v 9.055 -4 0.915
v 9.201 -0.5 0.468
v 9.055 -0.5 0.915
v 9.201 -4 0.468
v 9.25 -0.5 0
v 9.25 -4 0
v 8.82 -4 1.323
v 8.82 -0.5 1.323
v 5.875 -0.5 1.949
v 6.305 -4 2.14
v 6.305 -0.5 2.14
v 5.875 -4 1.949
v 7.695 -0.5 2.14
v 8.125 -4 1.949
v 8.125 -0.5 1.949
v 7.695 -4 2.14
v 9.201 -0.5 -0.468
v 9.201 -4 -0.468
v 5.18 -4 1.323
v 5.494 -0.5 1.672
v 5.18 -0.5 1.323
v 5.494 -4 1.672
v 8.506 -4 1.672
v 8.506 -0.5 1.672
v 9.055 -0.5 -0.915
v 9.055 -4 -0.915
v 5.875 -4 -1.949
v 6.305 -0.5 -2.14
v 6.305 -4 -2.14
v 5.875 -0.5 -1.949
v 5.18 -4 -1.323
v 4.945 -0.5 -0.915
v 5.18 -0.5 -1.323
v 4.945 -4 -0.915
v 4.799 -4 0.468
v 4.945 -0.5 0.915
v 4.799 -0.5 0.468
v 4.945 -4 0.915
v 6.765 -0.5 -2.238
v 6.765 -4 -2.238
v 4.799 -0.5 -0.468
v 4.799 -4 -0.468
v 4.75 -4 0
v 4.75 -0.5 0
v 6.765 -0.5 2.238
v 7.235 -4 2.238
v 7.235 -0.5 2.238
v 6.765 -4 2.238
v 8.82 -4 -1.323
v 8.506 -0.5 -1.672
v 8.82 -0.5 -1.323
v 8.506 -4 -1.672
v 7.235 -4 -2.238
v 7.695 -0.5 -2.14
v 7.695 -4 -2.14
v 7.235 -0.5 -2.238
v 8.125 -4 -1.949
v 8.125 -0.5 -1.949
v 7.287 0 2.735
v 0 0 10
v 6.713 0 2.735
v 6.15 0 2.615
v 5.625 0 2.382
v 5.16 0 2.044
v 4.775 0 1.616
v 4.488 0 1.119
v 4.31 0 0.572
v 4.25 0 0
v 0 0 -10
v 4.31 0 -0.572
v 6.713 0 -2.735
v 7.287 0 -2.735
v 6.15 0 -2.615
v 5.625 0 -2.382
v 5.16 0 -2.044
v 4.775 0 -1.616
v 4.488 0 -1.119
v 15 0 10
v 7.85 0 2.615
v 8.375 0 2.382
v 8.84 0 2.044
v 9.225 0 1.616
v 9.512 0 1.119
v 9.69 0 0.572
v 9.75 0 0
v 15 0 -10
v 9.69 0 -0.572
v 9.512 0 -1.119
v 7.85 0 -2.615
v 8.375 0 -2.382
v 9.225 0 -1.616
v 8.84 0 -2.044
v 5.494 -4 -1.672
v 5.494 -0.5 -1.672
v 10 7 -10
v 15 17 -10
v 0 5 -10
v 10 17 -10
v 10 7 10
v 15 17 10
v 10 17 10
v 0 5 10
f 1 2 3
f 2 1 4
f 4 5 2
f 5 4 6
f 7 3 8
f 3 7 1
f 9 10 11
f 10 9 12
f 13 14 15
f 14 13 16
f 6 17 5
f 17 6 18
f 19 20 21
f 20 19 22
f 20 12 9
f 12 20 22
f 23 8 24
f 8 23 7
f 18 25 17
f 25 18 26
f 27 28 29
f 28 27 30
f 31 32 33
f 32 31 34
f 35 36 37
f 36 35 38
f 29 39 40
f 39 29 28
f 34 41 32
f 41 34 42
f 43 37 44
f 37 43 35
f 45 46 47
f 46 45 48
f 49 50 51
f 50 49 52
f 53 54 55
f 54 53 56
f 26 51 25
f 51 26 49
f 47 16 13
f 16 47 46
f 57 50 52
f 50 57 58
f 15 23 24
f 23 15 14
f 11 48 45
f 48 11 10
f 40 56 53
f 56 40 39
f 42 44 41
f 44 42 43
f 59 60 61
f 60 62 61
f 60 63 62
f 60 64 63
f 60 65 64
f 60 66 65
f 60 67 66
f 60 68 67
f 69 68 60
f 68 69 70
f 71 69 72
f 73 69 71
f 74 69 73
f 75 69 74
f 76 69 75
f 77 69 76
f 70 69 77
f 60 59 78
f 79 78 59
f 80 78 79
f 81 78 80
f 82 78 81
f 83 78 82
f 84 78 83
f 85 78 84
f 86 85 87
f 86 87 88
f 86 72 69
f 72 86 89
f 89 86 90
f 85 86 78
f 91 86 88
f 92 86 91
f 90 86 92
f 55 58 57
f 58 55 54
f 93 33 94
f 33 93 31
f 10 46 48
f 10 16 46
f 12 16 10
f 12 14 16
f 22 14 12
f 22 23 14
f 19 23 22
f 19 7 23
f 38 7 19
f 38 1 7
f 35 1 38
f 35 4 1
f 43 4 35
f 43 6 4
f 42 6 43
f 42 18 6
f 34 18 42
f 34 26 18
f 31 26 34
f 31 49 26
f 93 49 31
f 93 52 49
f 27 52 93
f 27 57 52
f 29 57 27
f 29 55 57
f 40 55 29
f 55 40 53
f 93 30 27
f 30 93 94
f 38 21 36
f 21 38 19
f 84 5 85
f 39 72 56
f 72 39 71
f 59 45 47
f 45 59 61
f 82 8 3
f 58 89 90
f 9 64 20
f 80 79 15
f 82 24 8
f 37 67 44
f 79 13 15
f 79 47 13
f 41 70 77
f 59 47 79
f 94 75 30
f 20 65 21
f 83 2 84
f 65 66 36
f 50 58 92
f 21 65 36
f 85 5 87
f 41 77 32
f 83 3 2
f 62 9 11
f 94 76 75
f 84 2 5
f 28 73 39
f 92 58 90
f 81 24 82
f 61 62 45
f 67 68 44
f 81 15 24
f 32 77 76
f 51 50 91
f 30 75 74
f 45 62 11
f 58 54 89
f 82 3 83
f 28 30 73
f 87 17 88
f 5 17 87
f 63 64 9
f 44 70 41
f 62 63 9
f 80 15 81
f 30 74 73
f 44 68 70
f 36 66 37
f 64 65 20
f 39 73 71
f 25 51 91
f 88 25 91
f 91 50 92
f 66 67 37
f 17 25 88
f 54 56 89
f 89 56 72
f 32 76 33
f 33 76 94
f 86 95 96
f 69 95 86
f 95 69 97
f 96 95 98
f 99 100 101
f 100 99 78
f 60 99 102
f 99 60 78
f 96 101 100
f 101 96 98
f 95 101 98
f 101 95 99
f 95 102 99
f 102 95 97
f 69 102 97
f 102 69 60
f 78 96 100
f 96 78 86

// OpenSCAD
noswear_height=20;
noswear_depth=15;
noswear_width=17;

windowframe_depth=10;
windowframe_incline_ratio=.2; // 0=90degrees frame 1=45degrees bevel on the window frame
windowframe_width=10;
$fn=30;
pin_diameter=4.5;
pin_distance=7; //distance of the pin from the window
pin_height=4;
pin_relief_bevel_depth=0.5;

module noswear(){
union(){
linear_extrude(height =noswear_height, center = true){
polygon(points=[[0,0],[noswear_depth,0],[noswear_depth,noswear_width],[windowframe_depth,noswear_width],[windowframe_depth,noswear_width-windowframe_width],[0,noswear_width-windowframe_width-windowframe_incline_ratio*windowframe_depth]]);
}
translate([pin_distance,0,0])rotate([90,0,0])union(){
cylinder(h=pin_height,r=pin_diameter/2.);
cylinder(h=pin_relief_bevel_depth,r2=pin_diameter/2.,r1=pin_relief_bevel_depth+pin_diameter/2.);
}
}
}


noswear();
